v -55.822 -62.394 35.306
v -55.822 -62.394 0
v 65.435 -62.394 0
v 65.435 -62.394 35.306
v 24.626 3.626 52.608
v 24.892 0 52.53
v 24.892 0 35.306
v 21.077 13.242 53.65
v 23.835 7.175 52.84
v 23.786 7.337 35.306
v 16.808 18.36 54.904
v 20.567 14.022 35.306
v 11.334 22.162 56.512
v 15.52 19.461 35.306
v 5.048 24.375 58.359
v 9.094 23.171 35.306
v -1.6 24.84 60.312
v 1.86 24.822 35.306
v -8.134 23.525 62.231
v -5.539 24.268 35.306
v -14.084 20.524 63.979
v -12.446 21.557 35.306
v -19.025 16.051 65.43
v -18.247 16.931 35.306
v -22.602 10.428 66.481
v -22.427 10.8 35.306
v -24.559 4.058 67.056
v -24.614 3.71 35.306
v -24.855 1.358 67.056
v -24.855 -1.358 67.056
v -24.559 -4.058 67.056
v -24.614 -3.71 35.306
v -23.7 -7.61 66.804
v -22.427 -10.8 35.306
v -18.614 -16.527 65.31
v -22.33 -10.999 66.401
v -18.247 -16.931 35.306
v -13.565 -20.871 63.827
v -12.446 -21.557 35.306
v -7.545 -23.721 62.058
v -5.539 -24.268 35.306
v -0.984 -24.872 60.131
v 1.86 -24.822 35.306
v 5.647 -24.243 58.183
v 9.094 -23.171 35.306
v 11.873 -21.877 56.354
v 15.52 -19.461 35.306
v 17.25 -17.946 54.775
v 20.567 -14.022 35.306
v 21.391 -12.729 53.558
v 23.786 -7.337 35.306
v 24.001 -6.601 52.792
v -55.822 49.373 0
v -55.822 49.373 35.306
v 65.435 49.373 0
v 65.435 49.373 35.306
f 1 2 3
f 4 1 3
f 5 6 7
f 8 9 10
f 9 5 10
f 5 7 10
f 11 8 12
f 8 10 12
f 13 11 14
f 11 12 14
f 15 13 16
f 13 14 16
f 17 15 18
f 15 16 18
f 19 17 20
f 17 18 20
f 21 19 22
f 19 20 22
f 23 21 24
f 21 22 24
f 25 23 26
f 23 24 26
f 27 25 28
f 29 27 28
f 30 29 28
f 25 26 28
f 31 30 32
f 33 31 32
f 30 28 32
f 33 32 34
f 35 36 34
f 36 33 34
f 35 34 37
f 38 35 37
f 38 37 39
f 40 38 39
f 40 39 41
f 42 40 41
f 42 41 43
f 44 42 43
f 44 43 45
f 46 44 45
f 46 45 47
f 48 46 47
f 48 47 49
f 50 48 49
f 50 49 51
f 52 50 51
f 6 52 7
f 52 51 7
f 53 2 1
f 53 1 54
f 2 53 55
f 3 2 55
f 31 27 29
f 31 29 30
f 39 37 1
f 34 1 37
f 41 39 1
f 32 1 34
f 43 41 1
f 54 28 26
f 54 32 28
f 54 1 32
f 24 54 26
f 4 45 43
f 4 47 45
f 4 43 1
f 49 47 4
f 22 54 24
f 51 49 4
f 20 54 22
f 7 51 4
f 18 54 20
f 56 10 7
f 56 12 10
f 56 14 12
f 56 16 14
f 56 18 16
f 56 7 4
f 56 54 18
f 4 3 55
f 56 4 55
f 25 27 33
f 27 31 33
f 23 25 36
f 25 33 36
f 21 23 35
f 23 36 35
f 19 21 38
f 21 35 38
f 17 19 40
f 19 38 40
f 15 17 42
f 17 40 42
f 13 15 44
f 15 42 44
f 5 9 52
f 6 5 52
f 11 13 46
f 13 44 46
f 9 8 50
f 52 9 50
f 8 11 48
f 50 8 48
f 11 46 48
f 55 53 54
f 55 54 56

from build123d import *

# Parameters (mm, degrees)
F0_W     = 121.257108
F0_H     = 111.767154
F1_DEPTH = 35.306
F2_R     = 24.891724
F3_DEPTH = 31.75
F5_DEPTH = 152.654


with BuildPart() as f1:
    # F0 (on Top) → F1 (new body)
    with BuildSketch(Plane.XY):
        with Locations((4.806647, -6.510528)):
            Rectangle(F0_W, F0_H)
    extrude(amount=F1_DEPTH)

    # F2 (on face) → F3 (join)
    with BuildSketch(Plane.XY.offset(35.306)):
        Circle(F2_R)
    extrude(amount=F3_DEPTH)

    # F4 (on face) → F5 (cut)
    with BuildSketch(Plane.XZ.offset(62.394105)):
        Polygon((-27.139649, 79.367436), (-25.687542, 67.387573), (32.396633, 50.325349), (32.396633, 79.367436), align=None)
    extrude(amount=-F5_DEPTH, mode=Mode.SUBTRACT)


solid = f1.part
